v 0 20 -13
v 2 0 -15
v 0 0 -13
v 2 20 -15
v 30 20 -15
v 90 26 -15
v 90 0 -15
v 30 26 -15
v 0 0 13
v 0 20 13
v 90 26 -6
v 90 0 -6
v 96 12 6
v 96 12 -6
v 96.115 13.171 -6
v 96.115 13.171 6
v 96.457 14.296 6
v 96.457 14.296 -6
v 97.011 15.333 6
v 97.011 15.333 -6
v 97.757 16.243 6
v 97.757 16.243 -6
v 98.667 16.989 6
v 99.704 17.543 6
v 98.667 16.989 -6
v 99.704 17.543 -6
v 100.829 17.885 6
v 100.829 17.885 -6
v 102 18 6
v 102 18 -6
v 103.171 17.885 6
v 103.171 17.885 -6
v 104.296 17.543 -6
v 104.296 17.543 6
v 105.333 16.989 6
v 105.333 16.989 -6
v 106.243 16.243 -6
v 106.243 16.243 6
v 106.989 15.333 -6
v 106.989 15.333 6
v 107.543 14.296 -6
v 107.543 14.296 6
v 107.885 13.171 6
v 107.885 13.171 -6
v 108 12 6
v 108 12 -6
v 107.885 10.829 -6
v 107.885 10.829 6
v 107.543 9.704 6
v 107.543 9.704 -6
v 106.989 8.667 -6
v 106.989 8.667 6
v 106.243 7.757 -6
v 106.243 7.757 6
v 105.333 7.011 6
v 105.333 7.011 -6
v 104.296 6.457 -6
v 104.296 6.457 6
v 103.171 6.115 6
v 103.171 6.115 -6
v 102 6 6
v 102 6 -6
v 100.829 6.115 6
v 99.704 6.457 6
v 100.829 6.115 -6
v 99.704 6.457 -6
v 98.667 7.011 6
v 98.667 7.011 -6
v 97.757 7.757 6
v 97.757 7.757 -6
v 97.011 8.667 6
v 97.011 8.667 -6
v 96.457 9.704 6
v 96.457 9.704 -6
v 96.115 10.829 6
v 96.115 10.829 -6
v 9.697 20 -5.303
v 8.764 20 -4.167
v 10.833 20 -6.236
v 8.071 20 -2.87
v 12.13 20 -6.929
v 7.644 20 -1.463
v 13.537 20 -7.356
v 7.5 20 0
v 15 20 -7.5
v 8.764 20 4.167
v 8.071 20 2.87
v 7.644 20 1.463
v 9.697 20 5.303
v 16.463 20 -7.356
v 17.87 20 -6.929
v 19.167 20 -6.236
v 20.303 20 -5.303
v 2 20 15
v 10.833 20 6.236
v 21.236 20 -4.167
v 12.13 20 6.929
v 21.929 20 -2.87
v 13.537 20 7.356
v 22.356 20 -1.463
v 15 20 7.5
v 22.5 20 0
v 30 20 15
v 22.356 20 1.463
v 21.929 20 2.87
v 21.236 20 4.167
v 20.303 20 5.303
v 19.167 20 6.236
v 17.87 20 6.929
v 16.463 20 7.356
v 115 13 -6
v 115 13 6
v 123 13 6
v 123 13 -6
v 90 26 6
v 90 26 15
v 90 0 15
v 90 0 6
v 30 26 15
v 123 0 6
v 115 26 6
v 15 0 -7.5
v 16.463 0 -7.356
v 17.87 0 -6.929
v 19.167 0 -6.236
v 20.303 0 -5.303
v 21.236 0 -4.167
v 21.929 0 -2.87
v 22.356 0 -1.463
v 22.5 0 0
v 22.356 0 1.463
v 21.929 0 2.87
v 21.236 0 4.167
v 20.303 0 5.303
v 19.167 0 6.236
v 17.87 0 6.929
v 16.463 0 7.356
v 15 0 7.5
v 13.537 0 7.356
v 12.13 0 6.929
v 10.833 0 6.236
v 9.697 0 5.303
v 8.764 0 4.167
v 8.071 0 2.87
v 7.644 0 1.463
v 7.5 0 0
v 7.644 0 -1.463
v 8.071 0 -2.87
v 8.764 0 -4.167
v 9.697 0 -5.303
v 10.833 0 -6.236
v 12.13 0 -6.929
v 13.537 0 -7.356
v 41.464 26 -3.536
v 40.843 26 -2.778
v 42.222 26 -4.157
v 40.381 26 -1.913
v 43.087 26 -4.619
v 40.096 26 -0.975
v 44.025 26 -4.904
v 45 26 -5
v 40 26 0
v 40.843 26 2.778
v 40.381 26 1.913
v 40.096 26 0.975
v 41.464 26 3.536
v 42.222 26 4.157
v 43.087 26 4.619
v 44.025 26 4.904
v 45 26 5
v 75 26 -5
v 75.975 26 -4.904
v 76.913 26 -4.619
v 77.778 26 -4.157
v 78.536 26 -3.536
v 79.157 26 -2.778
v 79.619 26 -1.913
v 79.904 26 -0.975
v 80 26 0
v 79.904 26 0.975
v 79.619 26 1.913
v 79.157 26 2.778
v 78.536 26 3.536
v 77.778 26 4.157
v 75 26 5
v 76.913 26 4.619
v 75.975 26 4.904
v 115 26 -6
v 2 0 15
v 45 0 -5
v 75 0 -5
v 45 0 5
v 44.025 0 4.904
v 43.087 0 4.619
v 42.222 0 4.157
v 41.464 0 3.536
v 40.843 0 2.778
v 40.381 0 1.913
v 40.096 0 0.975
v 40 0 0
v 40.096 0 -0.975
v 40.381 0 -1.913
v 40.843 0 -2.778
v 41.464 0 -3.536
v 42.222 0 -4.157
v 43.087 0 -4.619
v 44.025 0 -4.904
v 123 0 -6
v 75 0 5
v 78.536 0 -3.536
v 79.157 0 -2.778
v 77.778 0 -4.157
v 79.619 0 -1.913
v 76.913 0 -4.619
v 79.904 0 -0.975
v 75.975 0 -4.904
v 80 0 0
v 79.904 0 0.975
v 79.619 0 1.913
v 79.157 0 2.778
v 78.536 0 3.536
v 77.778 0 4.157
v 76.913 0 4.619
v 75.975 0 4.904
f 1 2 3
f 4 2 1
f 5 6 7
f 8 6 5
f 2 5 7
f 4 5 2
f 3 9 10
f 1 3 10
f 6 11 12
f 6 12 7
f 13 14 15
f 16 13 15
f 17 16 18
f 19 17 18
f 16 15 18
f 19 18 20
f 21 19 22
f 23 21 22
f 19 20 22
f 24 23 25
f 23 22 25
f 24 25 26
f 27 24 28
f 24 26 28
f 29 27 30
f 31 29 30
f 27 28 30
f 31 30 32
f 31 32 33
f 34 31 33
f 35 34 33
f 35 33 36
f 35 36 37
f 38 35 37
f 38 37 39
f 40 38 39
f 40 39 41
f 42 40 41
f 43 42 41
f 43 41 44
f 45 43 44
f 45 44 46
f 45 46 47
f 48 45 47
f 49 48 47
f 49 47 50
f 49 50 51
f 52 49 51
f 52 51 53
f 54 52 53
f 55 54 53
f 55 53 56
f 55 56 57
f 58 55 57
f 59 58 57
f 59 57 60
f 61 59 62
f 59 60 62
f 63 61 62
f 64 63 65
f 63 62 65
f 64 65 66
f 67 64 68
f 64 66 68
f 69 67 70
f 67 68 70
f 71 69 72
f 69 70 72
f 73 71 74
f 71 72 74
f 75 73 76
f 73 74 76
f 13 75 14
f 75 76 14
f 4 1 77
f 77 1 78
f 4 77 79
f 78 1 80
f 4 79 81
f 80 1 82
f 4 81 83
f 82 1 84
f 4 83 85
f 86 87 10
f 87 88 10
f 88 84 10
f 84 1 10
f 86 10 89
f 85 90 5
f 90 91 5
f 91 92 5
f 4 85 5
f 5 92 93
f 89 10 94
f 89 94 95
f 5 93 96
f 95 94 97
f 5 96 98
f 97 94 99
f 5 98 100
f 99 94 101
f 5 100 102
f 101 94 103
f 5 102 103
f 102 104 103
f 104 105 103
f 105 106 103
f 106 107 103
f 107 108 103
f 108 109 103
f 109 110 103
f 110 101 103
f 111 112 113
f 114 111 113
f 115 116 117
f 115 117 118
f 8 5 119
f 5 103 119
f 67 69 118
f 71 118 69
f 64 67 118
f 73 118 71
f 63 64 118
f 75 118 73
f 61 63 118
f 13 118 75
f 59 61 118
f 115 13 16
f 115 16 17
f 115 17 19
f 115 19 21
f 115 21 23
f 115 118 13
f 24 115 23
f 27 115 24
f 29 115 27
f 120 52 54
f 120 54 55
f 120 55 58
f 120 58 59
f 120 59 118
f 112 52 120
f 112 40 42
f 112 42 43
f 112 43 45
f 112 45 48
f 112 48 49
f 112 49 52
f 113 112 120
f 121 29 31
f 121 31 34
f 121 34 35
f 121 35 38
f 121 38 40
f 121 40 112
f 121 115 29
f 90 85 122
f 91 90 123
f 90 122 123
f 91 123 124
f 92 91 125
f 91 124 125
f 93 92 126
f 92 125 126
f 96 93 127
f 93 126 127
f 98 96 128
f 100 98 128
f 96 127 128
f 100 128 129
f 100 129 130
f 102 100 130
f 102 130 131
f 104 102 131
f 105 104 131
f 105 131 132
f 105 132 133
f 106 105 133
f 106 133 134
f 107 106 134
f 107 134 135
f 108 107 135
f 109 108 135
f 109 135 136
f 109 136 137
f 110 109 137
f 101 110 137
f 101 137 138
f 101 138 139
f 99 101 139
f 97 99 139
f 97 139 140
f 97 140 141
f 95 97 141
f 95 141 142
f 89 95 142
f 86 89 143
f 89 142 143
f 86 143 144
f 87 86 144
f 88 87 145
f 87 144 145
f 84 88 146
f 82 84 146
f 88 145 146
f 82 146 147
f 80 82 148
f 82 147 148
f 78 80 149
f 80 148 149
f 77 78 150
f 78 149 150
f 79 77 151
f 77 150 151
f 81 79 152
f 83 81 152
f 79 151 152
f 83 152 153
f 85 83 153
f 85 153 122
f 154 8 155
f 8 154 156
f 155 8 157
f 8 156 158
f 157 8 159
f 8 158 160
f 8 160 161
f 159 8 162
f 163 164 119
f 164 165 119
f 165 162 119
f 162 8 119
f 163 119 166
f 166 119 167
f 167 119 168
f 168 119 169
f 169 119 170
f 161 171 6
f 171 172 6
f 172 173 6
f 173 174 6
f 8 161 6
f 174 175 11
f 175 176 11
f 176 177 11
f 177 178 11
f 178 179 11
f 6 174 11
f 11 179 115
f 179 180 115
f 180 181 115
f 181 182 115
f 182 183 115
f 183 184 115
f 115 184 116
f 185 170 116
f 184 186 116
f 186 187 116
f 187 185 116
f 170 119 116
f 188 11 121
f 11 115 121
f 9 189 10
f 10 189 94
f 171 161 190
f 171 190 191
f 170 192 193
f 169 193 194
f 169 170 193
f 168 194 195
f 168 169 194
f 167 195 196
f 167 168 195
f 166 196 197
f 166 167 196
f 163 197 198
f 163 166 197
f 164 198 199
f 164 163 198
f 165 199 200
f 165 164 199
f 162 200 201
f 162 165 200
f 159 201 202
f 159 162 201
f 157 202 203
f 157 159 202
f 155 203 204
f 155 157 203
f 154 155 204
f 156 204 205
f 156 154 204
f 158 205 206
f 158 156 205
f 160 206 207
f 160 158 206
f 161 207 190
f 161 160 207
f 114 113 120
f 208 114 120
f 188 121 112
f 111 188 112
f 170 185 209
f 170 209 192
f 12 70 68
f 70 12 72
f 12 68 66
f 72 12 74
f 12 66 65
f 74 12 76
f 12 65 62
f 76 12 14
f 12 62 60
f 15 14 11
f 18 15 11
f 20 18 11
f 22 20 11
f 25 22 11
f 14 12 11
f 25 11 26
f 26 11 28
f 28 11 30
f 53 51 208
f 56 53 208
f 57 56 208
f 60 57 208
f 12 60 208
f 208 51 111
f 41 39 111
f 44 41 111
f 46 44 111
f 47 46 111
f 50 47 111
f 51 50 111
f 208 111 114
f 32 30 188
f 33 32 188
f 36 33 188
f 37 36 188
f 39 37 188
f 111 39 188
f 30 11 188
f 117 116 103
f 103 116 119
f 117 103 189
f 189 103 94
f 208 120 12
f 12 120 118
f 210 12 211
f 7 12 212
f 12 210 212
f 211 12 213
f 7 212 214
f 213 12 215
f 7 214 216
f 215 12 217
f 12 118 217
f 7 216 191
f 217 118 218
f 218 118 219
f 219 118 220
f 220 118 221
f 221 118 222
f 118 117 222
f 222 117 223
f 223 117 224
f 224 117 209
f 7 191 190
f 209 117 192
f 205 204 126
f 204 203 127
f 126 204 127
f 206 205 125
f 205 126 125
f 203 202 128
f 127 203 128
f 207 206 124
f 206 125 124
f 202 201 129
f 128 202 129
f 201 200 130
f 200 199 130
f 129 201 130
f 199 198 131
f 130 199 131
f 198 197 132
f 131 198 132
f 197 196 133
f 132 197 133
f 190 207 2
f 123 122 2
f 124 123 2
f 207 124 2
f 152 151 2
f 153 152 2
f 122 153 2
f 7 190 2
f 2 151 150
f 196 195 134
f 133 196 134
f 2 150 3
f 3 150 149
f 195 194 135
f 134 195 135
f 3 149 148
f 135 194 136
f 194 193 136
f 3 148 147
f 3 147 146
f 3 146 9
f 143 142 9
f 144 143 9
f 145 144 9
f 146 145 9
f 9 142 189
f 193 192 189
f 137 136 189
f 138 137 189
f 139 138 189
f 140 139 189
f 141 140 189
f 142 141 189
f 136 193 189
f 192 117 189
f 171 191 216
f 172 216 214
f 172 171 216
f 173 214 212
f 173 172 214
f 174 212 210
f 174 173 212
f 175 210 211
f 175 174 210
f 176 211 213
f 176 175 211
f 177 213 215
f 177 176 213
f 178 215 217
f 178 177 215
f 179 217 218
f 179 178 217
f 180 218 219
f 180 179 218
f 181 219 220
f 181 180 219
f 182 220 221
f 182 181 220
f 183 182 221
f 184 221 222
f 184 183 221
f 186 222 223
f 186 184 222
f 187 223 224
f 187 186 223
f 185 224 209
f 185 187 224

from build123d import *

# Parameters (mm, degrees)
ESTRUSIONE_ESTRUSIONE1_DEPTH = 15
TAGLIO_ESTRUSIONE1_REACH     = 128.61
SCHIZZO5_W                   = 33
SCHIZZO5_H                   = 9
TAGLIO_ESTRUSIONE2_REACH     = 128.61
FORO_15_0_15_2_D             = 15
FORO_12_0_12_2_D             = 12
SMUSSO1_SIZE                 = 2


with BuildPart() as part:
    # Schizzo1 → Estrusione-Estrusione1 (new, symmetric)
    with BuildSketch(Plane.XY):
        Polygon((0, 0), (0, 20), (30, 20), (30, 26), (115, 26), (115, 13), (123, 13), (123, 0), align=None)
    extrude(amount=ESTRUSIONE_ESTRUSIONE1_DEPTH, both=True)

    # Schizzo5 → Taglio-Estrusione1 (cut, up to next)
    with BuildSketch(Plane(origin=(0, 26, 0), x_dir=(1, 0, 0), z_dir=(0, 1, 0)), mode=Mode.PRIVATE) as taglio_estrusione1_sk1:
        with Locations((106.5, 10.5)):
            Rectangle(SCHIZZO5_W, SCHIZZO5_H)
    taglio_estrusione1_tool1 = extrude(taglio_estrusione1_sk1.sketch, amount=-TAGLIO_ESTRUSIONE1_REACH, mode=Mode.PRIVATE) & part.part
    # Schizzo5 → Taglio-Estrusione1 (cut, up to next)
    with BuildSketch(Plane(origin=(0, 26, 0), x_dir=(1, 0, 0), z_dir=(0, 1, 0)), mode=Mode.PRIVATE) as taglio_estrusione1_sk2:
        with Locations((106.5, -10.5)):
            Rectangle(SCHIZZO5_W, SCHIZZO5_H)
    taglio_estrusione1_tool2 = extrude(taglio_estrusione1_sk2.sketch, amount=-TAGLIO_ESTRUSIONE1_REACH, mode=Mode.PRIVATE) & part.part
    add(taglio_estrusione1_tool1.solids().sort_by_distance((106.5, 26, -10.5))[0], mode=Mode.SUBTRACT)
    add(taglio_estrusione1_tool2.solids().sort_by_distance((106.5, 26, 10.5))[0], mode=Mode.SUBTRACT)

    # Schizzo6 → Taglio-Estrusione2 (cut, up to next)
    with BuildSketch(Plane(origin=(0, 26, 0), x_dir=(1, 0, 0), z_dir=(0, 1, 0)), mode=Mode.PRIVATE) as taglio_estrusione2_sk1:
        with BuildLine():
            Line((45, 5), (75, 5))
            ThreePointArc((75, 5), (80, 0), (75, -5))
            Line((75, -5), (45, -5))
            ThreePointArc((45, -5), (40, 0), (45, 5))
        make_face()
    taglio_estrusione2_tool1 = extrude(taglio_estrusione2_sk1.sketch, amount=-TAGLIO_ESTRUSIONE2_REACH, mode=Mode.PRIVATE) & part.part
    add(taglio_estrusione2_tool1.solids().sort_by_distance((60, 26, 0))[0], mode=Mode.SUBTRACT)

    # Foro Ø15.0 (15)-2 (through all)
    with Locations(Plane(origin=(15, 20, 0), x_dir=(0, 0, 1), z_dir=(0, 1, 0))):
        with Locations((0, 0)):
            Hole(FORO_15_0_15_2_D / 2)

    # Foro Ø12.0 (12)-2 (through all)
    with Locations(Plane(origin=(102, 12, 6), x_dir=(1, 0, 0), z_dir=(0, 0, 1))):
        with Locations((0, 0)):
            Hole(FORO_12_0_12_2_D / 2)

    # Smusso1
    smusso1_edges = [part.edges().sort_by_distance(p)[0] for p in [
        (0, 10, -15),
        (0, 10, 15),
    ]]
    chamfer(smusso1_edges, length=SMUSSO1_SIZE)


solid = part.part
